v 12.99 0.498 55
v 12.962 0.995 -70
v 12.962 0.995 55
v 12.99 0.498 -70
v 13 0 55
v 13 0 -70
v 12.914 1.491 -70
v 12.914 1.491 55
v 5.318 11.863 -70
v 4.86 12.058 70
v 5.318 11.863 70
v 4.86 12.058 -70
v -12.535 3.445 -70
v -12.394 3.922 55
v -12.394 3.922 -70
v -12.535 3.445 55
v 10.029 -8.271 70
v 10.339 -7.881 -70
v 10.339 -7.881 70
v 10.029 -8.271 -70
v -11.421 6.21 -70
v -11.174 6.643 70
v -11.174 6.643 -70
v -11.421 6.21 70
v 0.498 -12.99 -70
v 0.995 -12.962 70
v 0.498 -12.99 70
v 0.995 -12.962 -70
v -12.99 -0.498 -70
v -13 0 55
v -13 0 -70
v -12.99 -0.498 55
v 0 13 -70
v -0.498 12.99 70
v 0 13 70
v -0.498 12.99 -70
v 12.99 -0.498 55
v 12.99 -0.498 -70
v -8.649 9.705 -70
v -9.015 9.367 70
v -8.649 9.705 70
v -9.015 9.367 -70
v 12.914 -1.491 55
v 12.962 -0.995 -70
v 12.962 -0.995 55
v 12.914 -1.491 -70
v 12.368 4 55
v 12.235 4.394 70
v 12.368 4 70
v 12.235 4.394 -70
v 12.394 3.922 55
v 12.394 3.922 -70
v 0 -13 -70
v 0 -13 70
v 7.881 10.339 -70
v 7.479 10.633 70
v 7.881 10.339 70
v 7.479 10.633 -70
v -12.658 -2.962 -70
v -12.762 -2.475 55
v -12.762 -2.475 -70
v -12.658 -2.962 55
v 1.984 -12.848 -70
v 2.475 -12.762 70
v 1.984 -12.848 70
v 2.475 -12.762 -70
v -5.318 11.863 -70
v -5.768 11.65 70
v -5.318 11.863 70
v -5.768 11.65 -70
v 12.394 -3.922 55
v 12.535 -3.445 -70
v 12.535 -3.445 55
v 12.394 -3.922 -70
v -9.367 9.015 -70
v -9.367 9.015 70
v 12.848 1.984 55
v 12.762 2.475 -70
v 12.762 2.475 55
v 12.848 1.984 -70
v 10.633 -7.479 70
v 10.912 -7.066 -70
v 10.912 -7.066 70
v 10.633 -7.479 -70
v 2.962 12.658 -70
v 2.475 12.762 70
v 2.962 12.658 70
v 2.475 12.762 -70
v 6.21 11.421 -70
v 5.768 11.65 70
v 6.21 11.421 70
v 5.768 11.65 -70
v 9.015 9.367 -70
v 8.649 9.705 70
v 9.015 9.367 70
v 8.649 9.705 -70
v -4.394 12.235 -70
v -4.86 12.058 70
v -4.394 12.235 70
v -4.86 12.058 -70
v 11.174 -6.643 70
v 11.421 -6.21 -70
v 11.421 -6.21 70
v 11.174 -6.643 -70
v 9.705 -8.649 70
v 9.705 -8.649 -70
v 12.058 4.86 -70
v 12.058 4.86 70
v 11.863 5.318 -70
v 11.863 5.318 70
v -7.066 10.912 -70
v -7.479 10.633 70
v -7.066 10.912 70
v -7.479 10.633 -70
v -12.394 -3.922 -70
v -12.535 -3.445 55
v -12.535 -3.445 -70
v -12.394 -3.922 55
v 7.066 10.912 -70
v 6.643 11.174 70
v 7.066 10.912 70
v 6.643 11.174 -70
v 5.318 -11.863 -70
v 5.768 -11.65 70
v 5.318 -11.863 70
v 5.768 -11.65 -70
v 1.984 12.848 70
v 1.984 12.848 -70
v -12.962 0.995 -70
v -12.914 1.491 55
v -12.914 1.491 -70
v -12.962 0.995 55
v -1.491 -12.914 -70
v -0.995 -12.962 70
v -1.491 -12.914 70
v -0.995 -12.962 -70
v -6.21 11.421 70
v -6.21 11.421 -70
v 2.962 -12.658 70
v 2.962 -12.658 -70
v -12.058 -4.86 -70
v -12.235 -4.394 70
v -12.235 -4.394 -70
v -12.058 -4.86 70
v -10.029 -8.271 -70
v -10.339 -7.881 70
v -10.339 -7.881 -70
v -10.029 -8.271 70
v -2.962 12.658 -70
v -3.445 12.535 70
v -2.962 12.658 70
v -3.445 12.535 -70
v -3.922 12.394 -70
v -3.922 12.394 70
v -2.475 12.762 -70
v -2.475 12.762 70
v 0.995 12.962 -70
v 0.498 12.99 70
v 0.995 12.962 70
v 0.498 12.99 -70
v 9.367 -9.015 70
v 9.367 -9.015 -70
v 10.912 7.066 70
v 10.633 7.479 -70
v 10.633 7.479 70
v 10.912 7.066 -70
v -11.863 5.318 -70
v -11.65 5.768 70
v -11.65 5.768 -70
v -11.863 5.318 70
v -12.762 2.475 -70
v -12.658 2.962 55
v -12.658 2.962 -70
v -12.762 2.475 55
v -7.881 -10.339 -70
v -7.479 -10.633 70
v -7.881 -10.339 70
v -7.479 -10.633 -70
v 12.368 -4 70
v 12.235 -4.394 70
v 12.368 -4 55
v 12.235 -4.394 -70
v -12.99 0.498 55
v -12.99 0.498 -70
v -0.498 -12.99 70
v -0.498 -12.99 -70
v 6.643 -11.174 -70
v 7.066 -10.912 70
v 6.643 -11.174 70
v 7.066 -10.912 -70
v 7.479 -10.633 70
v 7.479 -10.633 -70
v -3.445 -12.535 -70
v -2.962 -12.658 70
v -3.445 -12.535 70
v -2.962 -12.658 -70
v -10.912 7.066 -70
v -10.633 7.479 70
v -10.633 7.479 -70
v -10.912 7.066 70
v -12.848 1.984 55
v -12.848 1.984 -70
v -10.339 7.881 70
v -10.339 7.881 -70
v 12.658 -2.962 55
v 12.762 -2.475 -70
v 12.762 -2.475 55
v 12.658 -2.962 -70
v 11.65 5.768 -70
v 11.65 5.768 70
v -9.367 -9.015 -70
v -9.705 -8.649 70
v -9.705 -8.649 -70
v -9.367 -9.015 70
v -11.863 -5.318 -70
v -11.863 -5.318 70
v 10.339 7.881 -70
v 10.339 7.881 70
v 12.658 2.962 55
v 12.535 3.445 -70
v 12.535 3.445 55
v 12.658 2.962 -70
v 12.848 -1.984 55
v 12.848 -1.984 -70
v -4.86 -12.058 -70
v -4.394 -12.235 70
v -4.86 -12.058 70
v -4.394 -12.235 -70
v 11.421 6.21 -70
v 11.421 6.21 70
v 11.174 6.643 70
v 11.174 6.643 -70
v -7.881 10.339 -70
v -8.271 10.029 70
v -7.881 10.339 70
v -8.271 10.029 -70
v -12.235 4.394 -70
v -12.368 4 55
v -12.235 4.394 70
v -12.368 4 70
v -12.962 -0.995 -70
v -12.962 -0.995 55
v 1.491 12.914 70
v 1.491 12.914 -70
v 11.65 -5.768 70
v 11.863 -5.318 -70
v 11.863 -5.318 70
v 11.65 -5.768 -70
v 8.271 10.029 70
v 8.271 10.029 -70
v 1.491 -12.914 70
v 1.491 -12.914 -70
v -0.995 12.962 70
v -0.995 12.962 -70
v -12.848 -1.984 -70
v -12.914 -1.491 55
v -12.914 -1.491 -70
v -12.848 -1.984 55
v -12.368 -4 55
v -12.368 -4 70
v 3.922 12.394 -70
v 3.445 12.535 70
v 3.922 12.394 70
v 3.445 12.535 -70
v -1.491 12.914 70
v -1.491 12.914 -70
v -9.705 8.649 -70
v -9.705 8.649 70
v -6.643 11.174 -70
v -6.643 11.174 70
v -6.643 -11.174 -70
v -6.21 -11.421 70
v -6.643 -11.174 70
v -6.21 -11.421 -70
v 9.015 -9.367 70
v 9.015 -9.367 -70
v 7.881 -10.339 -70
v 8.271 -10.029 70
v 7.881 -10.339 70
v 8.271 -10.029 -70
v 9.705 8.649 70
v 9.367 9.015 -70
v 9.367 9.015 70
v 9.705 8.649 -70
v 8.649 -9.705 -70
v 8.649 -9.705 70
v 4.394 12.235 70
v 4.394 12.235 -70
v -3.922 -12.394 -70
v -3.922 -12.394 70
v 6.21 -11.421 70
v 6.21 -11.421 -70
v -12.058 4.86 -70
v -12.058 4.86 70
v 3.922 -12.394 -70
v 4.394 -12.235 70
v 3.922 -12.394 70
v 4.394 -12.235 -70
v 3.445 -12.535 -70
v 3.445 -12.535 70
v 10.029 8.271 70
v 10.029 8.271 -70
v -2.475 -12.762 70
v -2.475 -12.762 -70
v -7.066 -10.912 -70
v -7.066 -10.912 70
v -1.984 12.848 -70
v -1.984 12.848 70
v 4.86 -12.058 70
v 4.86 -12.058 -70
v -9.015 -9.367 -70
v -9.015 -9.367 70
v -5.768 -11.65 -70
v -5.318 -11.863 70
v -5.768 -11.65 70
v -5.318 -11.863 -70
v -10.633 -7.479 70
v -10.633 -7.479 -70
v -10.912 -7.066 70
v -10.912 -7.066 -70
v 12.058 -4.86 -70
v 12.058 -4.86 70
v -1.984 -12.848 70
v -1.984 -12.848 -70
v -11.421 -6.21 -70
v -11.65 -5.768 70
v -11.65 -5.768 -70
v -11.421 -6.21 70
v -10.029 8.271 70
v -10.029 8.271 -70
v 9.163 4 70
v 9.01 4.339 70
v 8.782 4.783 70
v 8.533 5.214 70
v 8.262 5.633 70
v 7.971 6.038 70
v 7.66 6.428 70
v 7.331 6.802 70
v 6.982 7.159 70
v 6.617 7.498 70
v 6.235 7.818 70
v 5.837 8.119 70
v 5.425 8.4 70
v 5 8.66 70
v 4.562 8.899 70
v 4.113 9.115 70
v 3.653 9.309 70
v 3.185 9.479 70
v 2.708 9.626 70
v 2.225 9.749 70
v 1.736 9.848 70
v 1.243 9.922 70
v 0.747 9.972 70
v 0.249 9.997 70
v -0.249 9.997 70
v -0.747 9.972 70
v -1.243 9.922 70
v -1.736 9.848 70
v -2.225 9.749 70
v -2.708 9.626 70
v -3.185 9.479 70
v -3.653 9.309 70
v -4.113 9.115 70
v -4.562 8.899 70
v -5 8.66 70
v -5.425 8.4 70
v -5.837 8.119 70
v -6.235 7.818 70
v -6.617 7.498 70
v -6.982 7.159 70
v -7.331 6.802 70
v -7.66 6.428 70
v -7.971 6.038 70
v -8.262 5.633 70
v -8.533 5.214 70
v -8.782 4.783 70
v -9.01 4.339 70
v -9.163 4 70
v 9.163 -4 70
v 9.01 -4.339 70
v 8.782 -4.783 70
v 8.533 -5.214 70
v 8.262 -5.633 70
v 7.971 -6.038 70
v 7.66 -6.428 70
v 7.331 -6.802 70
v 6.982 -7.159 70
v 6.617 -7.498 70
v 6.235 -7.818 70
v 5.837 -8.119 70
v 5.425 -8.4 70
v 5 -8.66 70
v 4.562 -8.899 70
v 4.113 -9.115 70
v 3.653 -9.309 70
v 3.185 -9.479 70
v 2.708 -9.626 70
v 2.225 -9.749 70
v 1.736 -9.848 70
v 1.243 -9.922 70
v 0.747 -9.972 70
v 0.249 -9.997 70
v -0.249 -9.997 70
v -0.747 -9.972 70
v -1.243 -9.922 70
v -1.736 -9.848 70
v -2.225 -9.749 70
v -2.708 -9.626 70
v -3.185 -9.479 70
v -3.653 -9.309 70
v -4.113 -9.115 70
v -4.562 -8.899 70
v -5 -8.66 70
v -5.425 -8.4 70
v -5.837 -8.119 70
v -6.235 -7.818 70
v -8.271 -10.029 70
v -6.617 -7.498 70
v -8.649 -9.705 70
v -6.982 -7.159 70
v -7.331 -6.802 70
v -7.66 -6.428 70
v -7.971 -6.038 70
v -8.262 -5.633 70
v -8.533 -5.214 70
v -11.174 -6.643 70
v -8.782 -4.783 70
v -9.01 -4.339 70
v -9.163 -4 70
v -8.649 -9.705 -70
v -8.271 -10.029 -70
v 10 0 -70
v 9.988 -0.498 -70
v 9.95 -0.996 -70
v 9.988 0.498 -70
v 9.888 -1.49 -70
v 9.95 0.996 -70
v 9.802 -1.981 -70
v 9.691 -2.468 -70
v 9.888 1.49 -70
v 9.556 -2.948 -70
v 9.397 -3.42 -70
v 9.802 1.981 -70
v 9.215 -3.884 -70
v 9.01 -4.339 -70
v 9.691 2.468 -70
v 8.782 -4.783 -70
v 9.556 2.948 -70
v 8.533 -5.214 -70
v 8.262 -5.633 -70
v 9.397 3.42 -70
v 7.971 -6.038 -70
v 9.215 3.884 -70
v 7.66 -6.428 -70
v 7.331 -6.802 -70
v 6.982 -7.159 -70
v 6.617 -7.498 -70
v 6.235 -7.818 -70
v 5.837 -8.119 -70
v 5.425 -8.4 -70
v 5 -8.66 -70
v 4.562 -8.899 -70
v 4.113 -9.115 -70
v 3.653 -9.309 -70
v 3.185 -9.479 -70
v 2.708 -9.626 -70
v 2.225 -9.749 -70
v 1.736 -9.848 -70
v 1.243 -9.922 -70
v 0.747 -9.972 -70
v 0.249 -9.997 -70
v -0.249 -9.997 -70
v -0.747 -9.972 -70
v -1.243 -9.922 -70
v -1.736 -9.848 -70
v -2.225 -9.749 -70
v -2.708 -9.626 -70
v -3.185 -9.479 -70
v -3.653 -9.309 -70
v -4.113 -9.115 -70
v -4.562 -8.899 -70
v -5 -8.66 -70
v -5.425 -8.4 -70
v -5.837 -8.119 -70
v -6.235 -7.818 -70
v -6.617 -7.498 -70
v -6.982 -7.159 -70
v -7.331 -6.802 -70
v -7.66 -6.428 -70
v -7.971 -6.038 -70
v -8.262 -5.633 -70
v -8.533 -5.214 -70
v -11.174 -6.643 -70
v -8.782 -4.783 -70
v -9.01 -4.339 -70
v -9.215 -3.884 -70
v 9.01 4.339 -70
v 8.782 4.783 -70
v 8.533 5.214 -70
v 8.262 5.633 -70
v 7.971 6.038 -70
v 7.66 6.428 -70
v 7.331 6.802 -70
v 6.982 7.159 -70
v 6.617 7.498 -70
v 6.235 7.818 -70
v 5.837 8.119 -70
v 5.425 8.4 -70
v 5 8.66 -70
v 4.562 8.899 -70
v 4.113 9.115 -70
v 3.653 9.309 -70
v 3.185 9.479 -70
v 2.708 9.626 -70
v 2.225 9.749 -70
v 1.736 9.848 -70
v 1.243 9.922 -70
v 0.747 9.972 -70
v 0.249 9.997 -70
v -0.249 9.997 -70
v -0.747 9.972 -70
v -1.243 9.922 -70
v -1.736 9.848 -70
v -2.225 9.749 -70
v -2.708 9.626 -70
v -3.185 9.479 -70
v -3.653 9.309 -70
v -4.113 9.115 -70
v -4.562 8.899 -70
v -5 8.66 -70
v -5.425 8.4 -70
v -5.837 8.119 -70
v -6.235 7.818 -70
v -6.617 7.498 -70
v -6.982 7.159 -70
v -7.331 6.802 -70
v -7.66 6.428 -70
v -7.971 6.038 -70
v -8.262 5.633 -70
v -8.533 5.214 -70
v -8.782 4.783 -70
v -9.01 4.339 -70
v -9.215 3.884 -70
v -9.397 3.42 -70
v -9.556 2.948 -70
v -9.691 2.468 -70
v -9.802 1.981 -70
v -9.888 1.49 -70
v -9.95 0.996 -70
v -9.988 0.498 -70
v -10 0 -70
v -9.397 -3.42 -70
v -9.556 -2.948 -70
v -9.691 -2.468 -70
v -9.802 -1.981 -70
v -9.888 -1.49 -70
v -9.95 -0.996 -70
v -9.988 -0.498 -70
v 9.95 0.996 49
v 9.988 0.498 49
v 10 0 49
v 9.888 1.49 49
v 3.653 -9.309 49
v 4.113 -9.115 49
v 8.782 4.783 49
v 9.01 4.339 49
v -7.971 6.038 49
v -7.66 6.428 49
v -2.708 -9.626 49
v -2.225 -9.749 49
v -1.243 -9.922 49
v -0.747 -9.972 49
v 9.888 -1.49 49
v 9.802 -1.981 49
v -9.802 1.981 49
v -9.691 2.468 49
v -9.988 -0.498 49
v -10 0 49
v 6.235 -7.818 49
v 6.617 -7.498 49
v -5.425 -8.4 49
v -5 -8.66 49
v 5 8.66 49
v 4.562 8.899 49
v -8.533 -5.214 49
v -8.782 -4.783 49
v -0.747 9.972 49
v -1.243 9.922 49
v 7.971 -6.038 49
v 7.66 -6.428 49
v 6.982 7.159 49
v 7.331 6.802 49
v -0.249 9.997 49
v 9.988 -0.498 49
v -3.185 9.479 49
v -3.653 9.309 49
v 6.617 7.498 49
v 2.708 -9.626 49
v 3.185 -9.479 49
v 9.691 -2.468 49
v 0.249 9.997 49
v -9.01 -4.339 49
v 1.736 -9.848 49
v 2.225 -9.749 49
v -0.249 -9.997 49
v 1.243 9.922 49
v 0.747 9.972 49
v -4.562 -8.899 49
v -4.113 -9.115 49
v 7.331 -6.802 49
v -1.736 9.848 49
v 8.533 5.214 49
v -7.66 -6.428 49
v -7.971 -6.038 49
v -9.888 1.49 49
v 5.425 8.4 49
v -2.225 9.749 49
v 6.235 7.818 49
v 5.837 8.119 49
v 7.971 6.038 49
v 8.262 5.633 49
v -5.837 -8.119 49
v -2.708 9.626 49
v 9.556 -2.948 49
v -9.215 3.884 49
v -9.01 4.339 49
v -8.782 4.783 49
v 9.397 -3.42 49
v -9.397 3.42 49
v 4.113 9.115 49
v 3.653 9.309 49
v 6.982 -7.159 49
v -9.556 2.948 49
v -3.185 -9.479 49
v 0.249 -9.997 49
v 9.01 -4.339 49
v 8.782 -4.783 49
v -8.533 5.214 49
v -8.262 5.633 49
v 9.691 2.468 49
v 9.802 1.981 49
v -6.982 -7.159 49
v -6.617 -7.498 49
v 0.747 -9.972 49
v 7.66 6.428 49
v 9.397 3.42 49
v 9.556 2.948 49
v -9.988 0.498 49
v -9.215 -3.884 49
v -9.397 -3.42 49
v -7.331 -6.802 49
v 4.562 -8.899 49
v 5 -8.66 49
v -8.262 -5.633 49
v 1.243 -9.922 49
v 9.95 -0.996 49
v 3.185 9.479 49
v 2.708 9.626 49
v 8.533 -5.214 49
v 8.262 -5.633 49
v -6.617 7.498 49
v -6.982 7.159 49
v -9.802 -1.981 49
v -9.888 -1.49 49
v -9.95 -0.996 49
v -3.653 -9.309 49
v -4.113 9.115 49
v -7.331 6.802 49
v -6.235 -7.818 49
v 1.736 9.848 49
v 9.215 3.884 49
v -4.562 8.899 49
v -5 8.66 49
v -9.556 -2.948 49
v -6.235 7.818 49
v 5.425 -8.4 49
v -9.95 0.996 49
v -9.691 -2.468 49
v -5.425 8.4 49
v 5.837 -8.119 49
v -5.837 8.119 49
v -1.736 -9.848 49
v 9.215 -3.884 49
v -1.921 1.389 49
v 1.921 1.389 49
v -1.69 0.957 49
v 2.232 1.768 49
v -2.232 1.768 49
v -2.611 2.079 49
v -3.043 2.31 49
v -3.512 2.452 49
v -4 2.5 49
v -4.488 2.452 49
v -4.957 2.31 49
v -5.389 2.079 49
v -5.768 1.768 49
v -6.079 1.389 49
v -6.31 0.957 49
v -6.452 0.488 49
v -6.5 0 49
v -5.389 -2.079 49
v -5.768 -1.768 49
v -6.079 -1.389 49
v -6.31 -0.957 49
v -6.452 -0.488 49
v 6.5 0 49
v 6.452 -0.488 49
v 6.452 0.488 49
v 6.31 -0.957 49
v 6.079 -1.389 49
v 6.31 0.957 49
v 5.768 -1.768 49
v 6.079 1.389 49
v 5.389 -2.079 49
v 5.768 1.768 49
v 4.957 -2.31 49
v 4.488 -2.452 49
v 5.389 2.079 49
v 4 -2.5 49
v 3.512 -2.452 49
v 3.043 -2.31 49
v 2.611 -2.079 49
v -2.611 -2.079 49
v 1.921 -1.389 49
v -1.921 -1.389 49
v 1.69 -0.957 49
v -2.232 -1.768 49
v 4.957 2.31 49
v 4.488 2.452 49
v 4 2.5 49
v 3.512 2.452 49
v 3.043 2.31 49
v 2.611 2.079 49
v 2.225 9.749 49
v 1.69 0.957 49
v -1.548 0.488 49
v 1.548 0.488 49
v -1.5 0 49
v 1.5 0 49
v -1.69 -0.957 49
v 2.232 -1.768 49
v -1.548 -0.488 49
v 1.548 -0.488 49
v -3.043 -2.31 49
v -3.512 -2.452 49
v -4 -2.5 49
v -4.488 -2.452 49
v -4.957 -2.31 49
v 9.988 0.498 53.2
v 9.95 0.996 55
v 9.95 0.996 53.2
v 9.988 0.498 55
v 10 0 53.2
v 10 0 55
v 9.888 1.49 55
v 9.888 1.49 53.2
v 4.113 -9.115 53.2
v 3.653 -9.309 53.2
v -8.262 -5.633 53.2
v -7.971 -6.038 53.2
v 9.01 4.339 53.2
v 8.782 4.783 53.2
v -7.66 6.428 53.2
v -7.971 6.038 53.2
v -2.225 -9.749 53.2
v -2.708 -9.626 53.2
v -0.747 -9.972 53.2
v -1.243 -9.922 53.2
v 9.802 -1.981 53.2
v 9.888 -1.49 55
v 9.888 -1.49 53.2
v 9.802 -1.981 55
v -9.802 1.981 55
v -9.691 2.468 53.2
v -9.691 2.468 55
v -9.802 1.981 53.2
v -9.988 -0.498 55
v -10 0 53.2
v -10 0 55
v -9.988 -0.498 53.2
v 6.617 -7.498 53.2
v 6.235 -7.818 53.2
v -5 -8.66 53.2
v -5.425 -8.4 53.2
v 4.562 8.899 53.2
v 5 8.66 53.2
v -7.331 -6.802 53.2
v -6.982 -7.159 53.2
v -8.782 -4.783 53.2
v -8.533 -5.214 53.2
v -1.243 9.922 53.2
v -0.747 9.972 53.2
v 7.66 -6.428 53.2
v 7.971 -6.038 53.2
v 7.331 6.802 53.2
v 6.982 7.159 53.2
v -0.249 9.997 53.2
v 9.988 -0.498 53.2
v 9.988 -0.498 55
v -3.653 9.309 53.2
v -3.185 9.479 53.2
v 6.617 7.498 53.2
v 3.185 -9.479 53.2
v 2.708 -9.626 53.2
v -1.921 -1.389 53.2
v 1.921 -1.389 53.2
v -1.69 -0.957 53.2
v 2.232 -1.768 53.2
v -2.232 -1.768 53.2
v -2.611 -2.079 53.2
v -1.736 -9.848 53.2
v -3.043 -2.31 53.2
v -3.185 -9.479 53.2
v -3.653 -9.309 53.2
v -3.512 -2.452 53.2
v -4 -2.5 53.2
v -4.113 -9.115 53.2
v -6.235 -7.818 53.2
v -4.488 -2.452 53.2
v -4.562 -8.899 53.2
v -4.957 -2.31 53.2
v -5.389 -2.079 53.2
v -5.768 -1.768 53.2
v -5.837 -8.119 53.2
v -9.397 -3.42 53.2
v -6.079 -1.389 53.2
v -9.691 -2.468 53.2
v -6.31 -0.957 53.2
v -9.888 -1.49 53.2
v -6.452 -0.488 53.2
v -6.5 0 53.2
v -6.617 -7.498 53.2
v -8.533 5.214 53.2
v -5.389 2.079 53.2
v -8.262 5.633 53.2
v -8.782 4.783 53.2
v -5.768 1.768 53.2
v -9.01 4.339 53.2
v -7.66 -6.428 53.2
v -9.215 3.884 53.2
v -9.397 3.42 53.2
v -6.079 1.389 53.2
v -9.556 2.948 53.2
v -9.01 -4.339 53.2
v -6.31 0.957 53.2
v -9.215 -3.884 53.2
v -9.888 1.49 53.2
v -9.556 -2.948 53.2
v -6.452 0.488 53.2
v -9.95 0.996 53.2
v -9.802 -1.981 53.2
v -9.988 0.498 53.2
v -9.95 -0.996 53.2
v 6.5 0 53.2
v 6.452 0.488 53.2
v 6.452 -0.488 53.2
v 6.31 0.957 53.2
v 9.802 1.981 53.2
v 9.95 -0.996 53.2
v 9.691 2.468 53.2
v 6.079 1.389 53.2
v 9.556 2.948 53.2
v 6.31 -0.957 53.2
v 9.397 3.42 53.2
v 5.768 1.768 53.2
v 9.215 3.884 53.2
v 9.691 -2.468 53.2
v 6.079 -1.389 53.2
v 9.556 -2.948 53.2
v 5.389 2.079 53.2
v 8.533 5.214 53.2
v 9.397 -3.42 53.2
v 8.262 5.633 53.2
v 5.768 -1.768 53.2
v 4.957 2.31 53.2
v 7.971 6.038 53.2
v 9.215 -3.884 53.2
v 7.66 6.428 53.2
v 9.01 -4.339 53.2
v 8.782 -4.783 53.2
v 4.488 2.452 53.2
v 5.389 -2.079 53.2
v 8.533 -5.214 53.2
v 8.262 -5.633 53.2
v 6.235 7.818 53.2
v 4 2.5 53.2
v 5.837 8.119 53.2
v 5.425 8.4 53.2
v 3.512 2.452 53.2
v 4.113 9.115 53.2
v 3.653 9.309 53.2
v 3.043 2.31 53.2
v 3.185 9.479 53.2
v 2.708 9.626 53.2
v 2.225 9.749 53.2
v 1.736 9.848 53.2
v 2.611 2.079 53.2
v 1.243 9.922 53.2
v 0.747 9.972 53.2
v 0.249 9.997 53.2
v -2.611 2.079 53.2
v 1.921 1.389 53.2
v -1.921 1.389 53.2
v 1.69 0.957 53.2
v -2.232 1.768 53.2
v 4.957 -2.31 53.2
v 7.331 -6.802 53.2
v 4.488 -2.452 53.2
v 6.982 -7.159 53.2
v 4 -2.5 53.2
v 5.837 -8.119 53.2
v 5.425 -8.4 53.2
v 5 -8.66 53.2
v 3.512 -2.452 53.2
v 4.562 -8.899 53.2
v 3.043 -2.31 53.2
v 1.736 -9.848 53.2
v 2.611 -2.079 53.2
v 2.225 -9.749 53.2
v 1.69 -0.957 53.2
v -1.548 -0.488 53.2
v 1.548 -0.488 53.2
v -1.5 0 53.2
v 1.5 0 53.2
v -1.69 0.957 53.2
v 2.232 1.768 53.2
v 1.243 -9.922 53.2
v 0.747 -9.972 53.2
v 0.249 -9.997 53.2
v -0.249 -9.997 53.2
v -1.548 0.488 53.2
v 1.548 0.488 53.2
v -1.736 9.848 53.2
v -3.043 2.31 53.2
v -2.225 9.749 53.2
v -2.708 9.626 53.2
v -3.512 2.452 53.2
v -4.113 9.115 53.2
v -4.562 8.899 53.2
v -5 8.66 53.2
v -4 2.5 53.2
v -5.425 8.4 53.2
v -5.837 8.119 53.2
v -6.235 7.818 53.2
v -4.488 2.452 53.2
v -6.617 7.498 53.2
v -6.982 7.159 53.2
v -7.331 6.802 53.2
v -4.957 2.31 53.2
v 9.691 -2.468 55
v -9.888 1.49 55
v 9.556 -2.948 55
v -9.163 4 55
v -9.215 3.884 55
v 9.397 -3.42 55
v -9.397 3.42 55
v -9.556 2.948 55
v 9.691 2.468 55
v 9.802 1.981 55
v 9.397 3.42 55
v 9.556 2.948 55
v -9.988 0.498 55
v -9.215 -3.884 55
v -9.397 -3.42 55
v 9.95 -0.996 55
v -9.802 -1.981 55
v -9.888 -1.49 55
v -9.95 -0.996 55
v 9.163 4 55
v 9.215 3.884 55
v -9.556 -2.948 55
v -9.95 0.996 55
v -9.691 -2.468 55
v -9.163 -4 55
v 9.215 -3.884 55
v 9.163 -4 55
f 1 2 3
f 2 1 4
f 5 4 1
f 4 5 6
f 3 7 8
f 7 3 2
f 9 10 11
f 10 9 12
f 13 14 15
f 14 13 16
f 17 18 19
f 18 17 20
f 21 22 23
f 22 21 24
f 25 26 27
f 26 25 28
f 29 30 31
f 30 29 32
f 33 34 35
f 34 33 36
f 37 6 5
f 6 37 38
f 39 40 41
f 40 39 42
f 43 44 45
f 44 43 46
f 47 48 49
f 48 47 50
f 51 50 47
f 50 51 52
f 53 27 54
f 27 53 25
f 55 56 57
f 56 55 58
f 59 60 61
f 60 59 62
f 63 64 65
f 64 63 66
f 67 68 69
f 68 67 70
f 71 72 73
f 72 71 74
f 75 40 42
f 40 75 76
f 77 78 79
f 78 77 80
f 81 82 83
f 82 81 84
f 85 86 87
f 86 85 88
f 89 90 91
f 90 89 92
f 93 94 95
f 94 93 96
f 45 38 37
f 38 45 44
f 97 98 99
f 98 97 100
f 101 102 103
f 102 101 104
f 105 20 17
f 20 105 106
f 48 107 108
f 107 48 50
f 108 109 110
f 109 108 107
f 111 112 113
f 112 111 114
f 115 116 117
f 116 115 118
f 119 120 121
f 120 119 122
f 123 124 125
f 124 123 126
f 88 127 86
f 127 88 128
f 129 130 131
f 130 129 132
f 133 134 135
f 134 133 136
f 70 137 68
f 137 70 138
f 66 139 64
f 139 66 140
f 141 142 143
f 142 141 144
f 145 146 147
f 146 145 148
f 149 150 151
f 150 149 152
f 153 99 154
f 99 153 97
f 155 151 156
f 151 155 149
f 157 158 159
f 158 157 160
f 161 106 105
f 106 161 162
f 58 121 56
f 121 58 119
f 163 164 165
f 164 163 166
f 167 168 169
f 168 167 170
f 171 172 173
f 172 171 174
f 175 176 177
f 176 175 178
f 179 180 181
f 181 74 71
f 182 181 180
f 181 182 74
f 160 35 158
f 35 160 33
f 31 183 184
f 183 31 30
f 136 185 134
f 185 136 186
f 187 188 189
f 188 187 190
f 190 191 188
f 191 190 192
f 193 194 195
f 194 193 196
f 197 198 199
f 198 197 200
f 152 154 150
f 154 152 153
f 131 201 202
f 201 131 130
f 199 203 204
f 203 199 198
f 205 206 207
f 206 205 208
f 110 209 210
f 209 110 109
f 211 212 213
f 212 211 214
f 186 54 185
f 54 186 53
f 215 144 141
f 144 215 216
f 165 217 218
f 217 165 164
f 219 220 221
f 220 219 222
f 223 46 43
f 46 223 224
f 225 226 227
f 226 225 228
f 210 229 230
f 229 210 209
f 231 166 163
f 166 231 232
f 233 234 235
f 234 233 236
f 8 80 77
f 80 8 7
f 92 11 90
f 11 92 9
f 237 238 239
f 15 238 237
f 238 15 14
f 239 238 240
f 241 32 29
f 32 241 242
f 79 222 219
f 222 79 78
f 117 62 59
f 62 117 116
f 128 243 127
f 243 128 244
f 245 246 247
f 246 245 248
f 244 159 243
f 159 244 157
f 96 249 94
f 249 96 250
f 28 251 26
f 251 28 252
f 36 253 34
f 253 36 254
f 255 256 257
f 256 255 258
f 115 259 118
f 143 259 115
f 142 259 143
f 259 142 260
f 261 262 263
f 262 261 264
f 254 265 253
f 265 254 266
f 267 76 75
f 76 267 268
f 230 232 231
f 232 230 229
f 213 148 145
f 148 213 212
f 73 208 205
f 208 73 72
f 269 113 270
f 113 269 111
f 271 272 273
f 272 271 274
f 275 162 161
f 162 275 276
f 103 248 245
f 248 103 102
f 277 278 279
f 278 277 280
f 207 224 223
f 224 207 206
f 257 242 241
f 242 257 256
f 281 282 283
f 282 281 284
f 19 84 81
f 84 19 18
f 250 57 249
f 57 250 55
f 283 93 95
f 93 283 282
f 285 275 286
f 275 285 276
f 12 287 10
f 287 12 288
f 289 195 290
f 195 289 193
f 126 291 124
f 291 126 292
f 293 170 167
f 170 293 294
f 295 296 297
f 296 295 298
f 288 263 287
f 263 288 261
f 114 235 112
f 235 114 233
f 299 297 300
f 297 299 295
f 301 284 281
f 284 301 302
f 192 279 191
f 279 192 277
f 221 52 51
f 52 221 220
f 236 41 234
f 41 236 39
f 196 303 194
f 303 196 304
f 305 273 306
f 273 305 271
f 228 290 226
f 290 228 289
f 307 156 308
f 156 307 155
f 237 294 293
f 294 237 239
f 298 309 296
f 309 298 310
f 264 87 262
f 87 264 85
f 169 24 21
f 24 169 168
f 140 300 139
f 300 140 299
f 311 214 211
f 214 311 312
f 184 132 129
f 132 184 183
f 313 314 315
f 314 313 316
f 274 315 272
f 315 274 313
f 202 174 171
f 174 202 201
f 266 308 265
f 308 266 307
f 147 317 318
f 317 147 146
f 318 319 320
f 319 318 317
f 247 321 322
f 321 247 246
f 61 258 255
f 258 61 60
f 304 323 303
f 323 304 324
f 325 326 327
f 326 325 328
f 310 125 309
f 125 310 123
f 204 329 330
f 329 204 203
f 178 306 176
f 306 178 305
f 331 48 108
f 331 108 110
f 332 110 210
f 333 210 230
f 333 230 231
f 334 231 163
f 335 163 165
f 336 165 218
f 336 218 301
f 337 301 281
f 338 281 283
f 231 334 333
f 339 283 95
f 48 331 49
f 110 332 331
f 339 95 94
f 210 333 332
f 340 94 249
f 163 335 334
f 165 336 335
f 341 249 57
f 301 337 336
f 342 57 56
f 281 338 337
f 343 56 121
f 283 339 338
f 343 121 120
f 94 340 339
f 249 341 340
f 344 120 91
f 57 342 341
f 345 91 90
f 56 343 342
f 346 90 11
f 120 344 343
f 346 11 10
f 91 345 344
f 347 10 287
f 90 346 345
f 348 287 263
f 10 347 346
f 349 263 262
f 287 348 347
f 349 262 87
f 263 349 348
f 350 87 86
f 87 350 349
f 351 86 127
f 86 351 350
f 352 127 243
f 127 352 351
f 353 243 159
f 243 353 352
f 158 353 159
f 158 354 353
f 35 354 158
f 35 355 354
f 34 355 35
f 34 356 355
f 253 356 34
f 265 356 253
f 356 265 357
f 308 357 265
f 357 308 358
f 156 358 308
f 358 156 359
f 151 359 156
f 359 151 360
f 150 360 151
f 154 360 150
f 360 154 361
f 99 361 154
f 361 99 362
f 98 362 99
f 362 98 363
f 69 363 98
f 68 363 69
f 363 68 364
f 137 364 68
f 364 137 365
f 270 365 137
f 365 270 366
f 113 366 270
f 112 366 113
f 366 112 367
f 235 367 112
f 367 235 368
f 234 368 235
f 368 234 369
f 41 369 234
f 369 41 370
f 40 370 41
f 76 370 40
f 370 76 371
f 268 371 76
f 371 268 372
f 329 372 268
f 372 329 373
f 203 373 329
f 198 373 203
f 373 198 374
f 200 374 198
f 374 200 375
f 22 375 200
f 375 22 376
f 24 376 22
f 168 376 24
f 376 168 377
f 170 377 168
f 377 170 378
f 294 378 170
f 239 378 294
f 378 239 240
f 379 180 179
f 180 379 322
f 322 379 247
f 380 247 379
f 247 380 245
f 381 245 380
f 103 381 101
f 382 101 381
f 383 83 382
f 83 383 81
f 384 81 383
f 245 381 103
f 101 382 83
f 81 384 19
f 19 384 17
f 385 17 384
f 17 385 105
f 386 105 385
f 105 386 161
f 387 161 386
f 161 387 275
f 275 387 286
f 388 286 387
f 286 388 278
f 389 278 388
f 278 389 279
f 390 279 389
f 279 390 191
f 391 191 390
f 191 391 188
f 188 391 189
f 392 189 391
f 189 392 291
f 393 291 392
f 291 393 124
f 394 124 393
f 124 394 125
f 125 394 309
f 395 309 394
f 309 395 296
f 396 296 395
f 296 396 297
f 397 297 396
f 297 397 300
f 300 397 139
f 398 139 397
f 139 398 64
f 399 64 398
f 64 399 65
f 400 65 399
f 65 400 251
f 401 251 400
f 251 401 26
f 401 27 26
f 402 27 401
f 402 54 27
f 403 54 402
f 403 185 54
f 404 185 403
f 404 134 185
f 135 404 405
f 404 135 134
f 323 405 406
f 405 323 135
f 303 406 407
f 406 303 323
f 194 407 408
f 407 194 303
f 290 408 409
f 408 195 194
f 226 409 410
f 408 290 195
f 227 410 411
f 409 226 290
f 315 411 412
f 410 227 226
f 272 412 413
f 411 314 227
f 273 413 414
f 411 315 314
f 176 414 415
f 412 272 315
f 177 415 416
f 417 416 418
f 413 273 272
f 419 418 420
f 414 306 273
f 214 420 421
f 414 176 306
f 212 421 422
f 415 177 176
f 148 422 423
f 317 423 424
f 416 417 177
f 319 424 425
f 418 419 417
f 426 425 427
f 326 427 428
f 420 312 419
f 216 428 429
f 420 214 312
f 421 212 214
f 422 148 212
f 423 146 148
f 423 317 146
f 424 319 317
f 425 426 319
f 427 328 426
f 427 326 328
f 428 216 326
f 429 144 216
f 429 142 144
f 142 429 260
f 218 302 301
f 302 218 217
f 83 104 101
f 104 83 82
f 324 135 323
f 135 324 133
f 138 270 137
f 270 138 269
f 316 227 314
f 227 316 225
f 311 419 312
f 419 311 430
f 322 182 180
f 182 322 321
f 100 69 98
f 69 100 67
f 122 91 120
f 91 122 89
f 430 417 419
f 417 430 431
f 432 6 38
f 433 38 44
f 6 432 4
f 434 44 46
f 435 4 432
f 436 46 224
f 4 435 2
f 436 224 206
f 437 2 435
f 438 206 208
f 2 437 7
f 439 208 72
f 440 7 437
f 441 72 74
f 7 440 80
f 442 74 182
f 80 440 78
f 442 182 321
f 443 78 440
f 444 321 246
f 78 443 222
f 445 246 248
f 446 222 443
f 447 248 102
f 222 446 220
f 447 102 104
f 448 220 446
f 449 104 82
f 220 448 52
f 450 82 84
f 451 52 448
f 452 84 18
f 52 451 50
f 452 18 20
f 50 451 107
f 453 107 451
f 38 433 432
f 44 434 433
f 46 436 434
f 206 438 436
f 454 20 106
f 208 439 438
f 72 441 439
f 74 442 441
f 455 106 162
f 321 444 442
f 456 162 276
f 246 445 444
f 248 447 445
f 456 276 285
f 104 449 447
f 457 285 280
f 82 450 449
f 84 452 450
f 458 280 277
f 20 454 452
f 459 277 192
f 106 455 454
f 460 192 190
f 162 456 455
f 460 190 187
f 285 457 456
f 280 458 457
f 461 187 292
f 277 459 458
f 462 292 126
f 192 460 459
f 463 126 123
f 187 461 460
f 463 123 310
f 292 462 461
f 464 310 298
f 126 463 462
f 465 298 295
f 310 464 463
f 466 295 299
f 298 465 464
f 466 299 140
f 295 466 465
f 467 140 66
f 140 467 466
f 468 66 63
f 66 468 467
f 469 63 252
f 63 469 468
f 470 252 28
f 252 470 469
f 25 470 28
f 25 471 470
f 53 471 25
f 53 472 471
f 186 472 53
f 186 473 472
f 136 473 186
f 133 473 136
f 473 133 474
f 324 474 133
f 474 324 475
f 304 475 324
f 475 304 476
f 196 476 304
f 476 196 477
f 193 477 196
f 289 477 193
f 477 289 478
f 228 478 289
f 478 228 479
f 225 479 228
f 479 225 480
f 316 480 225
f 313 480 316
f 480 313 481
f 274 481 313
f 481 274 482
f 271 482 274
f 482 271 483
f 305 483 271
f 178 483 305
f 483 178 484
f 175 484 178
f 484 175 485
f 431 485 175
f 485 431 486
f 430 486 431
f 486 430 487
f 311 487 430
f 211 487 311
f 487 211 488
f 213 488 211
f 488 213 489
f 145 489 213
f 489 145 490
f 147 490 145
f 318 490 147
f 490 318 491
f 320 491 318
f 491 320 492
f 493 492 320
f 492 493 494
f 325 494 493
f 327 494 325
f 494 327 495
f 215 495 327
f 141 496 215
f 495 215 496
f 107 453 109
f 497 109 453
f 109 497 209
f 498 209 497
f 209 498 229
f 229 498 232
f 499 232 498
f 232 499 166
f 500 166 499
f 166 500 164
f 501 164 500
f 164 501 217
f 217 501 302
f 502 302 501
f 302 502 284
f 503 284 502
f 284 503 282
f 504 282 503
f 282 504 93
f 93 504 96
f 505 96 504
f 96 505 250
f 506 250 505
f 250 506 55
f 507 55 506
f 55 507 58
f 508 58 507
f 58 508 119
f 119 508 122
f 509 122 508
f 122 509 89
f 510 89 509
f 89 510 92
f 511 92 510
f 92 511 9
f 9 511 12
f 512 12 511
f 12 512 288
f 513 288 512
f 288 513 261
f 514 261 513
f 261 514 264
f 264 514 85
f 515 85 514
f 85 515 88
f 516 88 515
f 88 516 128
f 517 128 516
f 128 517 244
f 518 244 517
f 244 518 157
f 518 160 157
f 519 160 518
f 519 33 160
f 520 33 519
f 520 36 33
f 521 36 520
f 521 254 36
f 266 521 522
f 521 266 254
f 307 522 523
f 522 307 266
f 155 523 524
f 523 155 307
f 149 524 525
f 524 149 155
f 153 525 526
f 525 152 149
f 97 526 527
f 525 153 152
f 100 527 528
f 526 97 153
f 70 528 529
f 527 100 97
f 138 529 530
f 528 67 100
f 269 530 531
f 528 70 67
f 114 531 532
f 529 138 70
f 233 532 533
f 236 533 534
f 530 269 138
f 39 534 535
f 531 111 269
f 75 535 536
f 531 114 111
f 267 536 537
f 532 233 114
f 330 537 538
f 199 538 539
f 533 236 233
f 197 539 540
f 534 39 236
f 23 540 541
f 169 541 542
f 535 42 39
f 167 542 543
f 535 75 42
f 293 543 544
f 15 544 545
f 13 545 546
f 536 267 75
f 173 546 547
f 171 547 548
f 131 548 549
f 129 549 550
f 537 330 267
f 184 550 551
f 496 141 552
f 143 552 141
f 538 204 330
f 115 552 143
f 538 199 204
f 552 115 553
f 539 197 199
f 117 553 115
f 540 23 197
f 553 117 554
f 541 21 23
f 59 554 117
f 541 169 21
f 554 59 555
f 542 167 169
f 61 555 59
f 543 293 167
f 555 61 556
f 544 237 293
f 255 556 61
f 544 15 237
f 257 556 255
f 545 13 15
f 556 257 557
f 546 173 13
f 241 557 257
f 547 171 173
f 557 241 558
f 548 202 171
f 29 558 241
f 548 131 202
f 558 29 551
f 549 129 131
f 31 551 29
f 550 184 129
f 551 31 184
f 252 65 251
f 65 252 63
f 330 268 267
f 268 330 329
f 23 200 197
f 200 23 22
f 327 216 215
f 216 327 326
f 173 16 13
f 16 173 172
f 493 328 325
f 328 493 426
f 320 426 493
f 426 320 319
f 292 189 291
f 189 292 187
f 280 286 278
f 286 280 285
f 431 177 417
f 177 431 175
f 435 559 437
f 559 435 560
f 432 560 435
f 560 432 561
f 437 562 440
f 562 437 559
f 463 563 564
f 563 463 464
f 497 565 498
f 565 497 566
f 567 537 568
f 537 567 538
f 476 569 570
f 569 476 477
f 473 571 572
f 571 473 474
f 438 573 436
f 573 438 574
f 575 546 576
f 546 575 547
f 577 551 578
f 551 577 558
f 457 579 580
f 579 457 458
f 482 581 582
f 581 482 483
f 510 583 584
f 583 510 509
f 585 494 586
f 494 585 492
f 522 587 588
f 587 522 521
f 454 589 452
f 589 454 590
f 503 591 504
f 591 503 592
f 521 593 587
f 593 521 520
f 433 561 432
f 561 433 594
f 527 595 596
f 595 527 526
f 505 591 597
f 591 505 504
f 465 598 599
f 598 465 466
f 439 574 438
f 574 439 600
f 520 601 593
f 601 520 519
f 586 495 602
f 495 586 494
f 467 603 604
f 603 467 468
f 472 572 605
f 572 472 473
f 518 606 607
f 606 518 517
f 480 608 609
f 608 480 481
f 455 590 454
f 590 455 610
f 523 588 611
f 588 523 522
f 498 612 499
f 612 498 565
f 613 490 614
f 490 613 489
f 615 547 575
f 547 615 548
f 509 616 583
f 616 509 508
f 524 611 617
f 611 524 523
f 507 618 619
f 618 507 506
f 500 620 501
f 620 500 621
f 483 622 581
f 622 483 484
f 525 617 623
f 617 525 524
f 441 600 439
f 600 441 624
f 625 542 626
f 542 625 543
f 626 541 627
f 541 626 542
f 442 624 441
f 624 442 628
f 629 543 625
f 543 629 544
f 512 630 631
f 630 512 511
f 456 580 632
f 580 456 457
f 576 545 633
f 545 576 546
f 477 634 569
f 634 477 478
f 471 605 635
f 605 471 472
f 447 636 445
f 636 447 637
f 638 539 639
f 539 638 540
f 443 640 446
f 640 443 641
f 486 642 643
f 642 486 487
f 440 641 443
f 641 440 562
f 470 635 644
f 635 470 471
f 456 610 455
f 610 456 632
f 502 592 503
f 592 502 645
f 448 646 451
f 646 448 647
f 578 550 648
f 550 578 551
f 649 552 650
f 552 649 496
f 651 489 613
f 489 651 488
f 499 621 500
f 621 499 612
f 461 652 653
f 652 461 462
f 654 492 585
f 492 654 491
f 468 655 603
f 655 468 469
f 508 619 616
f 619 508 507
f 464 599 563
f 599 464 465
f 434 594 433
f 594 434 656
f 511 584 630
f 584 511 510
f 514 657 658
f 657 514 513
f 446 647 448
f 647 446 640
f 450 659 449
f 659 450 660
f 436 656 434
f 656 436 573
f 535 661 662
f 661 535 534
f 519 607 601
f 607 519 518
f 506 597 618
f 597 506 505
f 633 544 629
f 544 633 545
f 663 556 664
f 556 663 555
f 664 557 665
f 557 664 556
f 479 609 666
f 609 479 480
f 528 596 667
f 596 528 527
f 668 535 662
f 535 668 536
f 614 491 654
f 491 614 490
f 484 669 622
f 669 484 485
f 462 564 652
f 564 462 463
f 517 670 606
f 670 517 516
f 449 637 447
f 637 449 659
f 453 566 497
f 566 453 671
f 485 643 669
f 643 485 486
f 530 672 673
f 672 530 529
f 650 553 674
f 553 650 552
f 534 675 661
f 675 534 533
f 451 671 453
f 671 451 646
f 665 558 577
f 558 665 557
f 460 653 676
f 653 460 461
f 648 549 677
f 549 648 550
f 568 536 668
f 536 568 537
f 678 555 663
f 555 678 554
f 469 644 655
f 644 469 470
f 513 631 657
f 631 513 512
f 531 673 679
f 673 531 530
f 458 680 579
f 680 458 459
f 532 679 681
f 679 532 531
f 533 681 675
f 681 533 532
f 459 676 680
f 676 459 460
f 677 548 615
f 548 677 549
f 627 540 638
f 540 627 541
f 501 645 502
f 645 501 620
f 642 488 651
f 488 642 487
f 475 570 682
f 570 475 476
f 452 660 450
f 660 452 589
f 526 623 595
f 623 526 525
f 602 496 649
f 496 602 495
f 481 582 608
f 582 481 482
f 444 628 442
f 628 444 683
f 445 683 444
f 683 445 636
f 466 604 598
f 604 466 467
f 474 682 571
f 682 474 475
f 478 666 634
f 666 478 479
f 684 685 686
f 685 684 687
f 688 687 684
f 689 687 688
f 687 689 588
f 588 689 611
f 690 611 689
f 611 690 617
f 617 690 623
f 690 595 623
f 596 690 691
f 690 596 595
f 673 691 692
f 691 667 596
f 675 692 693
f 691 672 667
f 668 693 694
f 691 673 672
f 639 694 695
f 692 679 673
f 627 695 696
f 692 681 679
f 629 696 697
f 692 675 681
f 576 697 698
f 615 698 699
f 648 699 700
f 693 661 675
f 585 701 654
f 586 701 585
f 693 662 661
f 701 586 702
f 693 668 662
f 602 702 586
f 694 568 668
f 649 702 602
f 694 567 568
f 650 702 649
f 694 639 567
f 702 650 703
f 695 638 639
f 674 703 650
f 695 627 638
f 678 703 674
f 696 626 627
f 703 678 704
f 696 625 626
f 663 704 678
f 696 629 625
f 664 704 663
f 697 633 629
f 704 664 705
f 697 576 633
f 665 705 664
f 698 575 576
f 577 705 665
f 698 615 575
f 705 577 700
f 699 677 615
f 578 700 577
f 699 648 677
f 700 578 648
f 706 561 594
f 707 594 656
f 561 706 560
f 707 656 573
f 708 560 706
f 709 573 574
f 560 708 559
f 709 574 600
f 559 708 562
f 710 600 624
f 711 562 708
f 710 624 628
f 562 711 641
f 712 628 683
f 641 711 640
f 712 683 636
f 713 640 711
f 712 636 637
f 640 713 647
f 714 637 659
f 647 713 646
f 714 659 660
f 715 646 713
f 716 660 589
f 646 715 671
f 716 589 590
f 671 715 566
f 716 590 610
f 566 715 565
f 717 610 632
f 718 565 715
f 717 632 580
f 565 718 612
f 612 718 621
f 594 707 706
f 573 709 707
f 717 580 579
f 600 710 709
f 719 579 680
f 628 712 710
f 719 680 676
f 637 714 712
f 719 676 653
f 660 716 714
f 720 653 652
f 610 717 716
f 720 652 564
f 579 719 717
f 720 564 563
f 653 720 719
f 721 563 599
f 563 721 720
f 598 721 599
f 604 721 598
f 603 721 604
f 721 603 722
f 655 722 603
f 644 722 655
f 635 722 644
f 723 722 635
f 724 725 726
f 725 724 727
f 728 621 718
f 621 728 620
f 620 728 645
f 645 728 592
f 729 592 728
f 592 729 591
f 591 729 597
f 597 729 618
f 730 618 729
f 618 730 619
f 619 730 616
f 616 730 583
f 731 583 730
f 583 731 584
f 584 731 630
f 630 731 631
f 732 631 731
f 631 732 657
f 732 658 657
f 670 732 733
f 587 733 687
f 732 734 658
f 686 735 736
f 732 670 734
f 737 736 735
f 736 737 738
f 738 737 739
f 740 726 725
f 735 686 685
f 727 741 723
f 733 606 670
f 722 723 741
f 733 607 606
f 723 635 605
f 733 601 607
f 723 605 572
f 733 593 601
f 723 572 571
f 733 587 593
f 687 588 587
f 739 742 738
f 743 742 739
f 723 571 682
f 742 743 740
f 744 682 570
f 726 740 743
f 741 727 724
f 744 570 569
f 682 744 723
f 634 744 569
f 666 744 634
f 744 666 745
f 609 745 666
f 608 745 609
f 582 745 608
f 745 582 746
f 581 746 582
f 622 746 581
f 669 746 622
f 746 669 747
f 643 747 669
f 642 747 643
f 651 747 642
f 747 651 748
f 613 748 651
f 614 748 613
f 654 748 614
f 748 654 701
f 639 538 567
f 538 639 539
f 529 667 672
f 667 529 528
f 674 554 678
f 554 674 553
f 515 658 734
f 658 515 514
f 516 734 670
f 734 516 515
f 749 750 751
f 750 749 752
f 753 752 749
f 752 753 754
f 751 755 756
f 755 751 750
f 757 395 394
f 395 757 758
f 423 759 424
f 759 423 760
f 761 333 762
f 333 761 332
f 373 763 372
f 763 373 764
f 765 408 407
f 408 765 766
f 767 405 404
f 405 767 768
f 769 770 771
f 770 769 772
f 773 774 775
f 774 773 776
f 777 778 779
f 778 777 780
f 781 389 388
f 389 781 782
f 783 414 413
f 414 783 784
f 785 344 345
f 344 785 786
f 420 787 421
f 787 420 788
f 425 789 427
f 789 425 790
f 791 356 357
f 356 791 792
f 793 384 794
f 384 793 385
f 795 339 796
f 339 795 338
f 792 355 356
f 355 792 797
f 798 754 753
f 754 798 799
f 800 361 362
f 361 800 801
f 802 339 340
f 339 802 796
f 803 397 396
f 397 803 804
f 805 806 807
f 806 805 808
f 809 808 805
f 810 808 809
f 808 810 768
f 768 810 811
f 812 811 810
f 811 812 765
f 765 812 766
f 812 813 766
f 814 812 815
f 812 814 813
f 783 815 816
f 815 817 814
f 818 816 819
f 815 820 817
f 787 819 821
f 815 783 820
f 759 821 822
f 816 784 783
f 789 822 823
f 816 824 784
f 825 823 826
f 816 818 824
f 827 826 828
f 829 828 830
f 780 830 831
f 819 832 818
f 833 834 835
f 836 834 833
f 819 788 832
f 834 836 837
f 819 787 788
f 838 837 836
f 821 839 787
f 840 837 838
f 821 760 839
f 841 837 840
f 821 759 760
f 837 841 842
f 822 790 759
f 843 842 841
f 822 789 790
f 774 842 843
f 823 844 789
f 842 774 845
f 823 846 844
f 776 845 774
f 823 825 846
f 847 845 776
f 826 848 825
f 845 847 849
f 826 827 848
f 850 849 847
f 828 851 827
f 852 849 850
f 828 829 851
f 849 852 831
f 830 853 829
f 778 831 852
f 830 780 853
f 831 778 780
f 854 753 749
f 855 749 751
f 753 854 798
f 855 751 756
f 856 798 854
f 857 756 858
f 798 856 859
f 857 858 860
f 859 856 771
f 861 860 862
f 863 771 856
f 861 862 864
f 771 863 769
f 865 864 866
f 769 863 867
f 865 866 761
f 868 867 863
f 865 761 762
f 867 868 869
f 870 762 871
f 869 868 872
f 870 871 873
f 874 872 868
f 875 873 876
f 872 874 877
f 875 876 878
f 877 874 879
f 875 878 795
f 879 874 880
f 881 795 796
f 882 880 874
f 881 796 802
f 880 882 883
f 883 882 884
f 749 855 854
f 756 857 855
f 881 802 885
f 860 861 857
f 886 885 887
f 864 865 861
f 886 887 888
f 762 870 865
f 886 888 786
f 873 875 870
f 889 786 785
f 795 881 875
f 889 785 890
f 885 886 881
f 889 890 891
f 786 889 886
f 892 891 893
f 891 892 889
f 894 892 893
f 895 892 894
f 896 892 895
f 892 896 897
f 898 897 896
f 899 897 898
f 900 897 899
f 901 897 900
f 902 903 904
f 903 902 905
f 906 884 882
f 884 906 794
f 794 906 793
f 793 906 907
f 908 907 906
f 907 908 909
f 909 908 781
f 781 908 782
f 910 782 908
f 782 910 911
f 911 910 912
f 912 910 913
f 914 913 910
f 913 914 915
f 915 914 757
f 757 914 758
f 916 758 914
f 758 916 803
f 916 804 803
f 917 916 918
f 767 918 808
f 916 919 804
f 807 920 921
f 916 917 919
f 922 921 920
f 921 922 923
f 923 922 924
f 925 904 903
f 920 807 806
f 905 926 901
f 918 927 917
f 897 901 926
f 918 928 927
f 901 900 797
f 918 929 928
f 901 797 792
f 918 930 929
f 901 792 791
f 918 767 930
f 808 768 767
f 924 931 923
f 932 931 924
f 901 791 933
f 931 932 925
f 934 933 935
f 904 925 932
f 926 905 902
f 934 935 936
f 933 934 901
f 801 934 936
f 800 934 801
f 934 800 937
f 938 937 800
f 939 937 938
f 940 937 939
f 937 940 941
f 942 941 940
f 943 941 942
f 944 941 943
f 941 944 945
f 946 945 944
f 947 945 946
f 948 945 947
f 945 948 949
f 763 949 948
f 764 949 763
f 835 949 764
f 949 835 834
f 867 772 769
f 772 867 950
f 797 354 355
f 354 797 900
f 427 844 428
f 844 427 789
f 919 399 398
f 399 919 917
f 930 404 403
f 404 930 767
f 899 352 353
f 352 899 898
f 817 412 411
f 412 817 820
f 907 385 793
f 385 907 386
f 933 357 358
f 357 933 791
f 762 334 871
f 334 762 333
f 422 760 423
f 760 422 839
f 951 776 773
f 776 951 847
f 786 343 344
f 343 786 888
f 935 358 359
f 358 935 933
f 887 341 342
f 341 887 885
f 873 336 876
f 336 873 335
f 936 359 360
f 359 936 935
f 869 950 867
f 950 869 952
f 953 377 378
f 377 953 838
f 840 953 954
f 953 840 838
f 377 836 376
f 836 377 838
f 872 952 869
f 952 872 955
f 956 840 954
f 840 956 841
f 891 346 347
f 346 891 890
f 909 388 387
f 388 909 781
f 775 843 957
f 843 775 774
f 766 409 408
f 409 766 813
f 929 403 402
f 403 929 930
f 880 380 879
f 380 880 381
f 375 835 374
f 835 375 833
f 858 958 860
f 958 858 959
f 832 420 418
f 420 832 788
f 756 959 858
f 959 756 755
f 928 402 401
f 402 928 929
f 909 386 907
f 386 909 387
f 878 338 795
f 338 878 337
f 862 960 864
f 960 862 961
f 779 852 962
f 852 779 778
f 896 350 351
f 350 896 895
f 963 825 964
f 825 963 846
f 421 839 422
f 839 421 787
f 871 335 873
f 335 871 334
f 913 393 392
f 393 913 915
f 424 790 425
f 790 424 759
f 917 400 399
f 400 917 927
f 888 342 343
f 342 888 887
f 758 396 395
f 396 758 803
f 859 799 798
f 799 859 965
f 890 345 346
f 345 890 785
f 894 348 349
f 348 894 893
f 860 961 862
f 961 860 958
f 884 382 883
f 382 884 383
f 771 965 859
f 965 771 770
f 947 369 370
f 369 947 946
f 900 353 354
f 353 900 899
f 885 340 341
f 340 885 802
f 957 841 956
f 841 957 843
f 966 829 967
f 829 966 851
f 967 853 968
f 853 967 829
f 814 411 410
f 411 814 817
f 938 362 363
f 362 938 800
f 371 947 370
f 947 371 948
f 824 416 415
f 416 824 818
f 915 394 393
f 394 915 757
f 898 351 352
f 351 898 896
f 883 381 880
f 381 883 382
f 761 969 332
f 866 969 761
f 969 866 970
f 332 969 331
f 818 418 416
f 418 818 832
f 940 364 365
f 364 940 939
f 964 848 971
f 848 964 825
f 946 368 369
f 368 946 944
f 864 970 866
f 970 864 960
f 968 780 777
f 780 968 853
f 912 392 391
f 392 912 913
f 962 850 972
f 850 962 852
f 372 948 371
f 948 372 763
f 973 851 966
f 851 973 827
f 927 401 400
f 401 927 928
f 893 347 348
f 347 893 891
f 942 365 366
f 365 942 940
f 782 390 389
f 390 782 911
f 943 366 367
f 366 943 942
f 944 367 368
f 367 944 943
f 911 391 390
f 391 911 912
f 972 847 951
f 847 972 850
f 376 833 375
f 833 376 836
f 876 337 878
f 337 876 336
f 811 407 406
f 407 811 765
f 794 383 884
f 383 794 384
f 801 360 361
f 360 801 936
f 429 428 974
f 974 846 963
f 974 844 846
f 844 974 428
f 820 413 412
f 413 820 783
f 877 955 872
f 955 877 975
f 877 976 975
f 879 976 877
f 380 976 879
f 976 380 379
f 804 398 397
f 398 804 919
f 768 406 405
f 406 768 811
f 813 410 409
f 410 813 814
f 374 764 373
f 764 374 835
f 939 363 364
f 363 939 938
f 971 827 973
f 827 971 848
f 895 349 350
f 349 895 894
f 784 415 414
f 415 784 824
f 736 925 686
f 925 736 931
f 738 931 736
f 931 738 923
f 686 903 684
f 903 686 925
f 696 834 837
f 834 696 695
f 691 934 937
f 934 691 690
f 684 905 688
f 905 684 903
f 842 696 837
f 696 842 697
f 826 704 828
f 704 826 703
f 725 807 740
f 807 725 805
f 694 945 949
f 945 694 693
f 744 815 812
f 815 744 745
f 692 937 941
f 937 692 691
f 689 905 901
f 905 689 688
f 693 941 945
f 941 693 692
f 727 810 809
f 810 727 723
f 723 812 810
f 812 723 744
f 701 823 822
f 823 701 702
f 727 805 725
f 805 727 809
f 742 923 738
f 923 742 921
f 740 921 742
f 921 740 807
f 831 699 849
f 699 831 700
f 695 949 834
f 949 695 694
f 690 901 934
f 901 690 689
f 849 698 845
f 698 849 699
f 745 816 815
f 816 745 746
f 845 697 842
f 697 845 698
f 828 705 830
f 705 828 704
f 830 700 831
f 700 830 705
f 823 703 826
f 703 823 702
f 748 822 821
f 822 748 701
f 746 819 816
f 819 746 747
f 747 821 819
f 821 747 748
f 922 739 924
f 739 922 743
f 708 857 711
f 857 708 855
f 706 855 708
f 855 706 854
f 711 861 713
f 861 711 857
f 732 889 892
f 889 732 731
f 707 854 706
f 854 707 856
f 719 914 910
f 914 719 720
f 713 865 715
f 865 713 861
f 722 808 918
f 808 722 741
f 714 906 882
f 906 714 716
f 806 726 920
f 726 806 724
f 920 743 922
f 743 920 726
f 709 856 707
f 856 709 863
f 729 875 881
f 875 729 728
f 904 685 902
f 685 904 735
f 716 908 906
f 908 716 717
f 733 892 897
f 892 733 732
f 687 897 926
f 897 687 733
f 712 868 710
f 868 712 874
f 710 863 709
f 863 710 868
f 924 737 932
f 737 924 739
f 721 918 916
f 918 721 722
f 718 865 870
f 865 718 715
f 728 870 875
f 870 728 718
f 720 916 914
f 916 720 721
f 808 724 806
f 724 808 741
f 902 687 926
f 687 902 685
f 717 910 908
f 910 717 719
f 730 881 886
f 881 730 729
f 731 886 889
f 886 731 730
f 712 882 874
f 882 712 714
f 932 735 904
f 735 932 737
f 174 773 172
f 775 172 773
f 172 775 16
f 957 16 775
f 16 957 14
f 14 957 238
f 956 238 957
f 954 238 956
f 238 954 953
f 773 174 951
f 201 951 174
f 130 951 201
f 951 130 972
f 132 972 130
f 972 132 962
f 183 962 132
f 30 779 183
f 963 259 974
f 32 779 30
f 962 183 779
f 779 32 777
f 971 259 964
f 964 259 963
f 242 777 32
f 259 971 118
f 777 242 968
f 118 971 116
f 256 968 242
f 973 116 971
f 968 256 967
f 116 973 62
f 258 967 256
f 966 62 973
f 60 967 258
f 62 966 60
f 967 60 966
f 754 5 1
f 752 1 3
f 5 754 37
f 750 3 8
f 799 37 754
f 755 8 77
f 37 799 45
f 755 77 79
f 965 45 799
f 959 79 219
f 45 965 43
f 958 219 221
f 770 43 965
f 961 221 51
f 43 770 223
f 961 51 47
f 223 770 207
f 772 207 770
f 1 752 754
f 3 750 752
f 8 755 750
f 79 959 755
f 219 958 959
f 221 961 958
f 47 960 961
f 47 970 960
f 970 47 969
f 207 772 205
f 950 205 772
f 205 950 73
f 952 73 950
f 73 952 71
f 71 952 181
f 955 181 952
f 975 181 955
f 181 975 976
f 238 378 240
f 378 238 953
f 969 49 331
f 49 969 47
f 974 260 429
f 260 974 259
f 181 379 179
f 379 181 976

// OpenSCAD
$fs = 0.5;
$fa = 1;

inner_r=10;
 wall_thickness=3;
 length= 140;
 
  screw_r=2.5;
 
 screw_distance=4;
 
 outer_r=inner_r+wall_thickness;

difference() {
    
    
  cylinder(h=length,r1=outer_r,r2=outer_r,center=true);
    
    
translate([0,0,-length*.65])
cylinder(h=length,r1=inner_r,r2=inner_r,center=false);

translate([0,0,length*.38])
cylinder(h=length*.15,r1=inner_r,r2=inner_r,center=false);

 translate([-screw_distance,0,0])
 cylinder(h=length*2, r1=screw_r, r2=screw_r, center=true);
 
 translate([screw_distance,0,0])
 cylinder(h=length*2, r1=screw_r, r2=screw_r, center=true);
 
 
 translate([0,0,length*.75])
 cube(size=[100,8,100],center=true);   
 
}


//difference() {
    
//cylinder(h=length,r1=outer_r,r2=outer_r,center=true);
    
//translate([0,0,-length*.75])
//cylinder(h=length,r1=inner_r,r2=inner_r,center=false);

//}
